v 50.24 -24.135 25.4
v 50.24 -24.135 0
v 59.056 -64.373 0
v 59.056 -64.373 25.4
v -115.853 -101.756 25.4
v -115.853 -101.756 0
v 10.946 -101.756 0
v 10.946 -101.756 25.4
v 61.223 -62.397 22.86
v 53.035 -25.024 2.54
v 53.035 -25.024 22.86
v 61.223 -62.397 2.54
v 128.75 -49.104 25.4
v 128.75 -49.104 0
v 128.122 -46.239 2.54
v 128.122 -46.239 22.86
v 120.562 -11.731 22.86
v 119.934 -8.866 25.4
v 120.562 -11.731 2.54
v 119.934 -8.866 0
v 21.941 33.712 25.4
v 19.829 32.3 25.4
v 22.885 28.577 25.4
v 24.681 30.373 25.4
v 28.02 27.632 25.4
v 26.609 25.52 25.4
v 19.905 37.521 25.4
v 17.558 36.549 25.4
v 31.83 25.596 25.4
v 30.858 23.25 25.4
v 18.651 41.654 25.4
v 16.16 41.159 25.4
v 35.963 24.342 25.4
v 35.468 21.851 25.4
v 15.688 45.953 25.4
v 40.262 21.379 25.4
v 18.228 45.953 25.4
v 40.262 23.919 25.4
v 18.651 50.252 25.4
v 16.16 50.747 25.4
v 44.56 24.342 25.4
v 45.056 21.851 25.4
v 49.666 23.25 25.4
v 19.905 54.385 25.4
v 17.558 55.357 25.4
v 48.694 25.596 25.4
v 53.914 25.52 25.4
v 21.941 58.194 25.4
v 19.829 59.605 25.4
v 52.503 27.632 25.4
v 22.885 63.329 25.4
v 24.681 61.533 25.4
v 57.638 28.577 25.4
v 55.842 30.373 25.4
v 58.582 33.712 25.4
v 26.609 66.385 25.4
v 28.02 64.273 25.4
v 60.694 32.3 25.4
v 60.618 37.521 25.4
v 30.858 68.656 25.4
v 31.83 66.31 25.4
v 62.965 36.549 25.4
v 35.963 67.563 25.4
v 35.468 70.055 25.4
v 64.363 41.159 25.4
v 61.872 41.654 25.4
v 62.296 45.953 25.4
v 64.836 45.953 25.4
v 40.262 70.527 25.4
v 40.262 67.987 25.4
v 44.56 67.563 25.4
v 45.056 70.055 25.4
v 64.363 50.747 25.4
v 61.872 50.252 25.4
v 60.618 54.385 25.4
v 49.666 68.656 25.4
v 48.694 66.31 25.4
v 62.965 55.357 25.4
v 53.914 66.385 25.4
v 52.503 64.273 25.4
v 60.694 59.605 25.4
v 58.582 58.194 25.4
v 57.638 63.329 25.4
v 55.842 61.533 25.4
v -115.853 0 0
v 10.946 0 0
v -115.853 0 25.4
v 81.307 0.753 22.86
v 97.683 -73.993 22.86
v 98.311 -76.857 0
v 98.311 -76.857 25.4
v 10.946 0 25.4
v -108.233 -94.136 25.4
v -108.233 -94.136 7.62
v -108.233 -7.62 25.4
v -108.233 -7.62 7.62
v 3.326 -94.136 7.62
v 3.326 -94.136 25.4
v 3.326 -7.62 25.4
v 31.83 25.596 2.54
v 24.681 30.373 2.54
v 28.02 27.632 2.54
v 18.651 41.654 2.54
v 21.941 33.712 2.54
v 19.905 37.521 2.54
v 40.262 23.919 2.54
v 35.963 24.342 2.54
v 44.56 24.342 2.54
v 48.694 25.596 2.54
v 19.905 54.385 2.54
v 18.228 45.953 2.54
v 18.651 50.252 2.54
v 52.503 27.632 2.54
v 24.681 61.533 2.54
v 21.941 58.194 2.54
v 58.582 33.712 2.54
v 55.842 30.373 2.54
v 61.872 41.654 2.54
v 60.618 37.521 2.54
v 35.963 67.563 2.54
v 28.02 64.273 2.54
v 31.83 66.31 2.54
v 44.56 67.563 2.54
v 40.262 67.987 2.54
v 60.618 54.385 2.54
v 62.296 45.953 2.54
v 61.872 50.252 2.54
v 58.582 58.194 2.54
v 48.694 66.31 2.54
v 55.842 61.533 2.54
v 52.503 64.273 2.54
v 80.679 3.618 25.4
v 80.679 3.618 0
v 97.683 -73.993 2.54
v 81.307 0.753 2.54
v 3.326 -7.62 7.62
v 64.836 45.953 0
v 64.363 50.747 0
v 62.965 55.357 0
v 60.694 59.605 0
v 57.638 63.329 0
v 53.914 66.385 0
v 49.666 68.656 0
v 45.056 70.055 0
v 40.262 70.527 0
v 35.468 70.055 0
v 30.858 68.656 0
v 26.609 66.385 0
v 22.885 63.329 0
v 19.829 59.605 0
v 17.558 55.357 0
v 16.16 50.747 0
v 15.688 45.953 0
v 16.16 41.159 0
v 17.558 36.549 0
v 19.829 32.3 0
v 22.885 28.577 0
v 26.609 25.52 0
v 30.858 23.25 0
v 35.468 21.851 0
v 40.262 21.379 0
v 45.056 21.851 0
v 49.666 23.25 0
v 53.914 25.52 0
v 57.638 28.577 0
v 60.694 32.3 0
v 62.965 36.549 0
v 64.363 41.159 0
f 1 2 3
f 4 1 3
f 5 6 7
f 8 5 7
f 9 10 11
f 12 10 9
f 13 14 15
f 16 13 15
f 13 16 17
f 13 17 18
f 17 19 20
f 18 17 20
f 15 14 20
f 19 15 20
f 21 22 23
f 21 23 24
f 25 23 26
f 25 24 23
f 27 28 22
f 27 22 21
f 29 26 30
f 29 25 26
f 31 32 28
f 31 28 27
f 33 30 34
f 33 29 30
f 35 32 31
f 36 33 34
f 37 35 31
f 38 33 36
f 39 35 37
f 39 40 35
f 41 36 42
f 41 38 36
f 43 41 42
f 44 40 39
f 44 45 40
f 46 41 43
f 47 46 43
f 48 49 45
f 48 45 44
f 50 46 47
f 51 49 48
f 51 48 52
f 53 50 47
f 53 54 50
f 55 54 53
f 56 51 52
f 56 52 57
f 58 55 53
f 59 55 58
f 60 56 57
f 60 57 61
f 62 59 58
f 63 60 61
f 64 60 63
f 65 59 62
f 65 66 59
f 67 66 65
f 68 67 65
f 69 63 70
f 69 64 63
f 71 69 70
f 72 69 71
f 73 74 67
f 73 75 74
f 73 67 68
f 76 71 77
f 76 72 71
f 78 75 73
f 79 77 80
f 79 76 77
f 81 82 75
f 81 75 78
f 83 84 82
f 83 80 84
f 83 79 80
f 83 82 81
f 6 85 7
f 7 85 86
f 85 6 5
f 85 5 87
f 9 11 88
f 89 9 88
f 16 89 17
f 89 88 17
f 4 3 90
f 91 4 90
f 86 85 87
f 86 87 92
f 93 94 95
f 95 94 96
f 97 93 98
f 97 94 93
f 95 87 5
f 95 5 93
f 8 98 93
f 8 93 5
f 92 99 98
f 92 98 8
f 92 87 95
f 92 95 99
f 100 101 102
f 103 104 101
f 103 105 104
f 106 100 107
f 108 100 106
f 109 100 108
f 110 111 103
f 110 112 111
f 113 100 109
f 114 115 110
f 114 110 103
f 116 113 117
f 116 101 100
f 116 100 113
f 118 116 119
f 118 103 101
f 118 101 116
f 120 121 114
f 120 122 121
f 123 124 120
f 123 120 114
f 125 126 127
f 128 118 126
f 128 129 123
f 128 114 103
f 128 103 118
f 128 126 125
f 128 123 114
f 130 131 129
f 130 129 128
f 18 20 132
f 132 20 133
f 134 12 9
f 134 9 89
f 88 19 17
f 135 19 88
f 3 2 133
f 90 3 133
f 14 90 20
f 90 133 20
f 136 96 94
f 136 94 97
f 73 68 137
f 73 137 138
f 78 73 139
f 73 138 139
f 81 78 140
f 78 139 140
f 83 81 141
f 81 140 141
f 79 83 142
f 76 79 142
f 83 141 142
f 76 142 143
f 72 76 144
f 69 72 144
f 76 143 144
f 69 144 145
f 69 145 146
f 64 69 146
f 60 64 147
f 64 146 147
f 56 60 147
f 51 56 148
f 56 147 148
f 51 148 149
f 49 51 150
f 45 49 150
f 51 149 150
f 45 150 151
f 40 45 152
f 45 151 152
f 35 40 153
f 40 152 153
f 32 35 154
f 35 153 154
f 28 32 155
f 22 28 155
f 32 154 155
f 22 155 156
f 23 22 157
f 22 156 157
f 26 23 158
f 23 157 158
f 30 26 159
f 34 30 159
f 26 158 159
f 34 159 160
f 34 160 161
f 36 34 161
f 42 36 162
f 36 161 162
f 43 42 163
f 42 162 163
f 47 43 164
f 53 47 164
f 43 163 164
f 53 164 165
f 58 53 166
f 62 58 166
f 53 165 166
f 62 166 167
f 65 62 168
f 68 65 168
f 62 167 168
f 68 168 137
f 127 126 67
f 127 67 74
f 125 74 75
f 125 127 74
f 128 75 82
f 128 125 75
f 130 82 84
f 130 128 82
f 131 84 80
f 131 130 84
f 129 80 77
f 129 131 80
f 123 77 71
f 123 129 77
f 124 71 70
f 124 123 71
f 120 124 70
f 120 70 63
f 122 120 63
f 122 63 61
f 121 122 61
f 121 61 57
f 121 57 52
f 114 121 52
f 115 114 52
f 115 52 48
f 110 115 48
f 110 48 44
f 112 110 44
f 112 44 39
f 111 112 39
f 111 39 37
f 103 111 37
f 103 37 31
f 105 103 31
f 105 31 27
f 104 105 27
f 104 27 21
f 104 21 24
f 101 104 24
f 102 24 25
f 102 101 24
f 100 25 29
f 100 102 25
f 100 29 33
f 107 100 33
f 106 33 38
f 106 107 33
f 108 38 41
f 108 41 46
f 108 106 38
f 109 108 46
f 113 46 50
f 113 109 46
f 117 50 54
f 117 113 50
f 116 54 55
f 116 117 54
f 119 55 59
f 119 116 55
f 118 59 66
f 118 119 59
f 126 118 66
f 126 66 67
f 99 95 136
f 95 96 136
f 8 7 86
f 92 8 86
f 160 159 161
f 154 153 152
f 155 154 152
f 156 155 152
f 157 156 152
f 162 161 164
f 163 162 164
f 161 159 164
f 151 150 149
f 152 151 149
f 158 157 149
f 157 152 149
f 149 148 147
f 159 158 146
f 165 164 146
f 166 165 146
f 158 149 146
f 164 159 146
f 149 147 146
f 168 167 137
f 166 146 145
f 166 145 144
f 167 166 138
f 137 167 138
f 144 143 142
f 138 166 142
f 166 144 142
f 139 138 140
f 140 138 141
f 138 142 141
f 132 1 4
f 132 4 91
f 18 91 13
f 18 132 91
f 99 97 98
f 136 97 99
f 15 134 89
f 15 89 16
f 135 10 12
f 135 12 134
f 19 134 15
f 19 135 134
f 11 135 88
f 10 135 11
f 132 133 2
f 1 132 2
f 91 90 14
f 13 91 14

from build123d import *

# Parameters (mm, degrees)
F0_W     = 126.7988150939
F0_H     = 101.7564386129
F1_DEPTH = 25.4
F0_R     = 24.5739182838
F2_T     = -7.62
F3_T     = -2.54
F4_T     = -2.54


# Not quite as in the source:
# - a feature of the source that left no trace in its solid (it failed there, or was rolled back) is left out


with BuildPart() as f1:
    # F0 (on Top) → F1 (new body)
    with BuildSketch(Plane.XY):
        with Locations((-52.4532389827, -50.8782193065)):
            Rectangle(F0_W, F0_H)
    extrude(amount=F1_DEPTH)

    # F2
    f2_openings = [f1.faces().sort_by_distance(p)[0] for p in [
        (-52.453239, -50.878219, 25.4),
    ]]
    offset(amount=F2_T, openings=f2_openings)


with BuildPart() as f1b:
    # F0 (on Top) → F1, piece 2 (new body)
    with BuildSketch(Plane.XY):
        with Locations((40.2616634965, 45.9529422224)):
            Circle(F0_R)
    extrude(amount=F1_DEPTH)

    # F3
    f3_openings = [f1b.faces().sort_by_distance(p)[0] for p in [
        (40.261663, 45.952942, 25.4),
    ]]
    offset(amount=F3_T, openings=f3_openings)


with BuildPart() as f1c:
    # F0 (on Top) → F1, piece 3 (new body)
    with BuildSketch(Plane.XY):
        Polygon((98.3106148388, -76.8574930794), (128.7498819683, -49.104034149), (119.9343150564, -8.866126077), (80.679481015, 3.6183230645), (50.2402138855, -24.1351358659), (59.0557807974, -64.3730439379), align=None)
    extrude(amount=F1_DEPTH)

    # F4
    f4_openings = [f1c.faces().sort_by_distance(p)[0] for p in [
        (124.342099, -28.98508, 12.7),
    ]]
    offset(amount=F4_T, openings=f4_openings)


solid = Compound([f1.part, f1b.part, f1c.part])
